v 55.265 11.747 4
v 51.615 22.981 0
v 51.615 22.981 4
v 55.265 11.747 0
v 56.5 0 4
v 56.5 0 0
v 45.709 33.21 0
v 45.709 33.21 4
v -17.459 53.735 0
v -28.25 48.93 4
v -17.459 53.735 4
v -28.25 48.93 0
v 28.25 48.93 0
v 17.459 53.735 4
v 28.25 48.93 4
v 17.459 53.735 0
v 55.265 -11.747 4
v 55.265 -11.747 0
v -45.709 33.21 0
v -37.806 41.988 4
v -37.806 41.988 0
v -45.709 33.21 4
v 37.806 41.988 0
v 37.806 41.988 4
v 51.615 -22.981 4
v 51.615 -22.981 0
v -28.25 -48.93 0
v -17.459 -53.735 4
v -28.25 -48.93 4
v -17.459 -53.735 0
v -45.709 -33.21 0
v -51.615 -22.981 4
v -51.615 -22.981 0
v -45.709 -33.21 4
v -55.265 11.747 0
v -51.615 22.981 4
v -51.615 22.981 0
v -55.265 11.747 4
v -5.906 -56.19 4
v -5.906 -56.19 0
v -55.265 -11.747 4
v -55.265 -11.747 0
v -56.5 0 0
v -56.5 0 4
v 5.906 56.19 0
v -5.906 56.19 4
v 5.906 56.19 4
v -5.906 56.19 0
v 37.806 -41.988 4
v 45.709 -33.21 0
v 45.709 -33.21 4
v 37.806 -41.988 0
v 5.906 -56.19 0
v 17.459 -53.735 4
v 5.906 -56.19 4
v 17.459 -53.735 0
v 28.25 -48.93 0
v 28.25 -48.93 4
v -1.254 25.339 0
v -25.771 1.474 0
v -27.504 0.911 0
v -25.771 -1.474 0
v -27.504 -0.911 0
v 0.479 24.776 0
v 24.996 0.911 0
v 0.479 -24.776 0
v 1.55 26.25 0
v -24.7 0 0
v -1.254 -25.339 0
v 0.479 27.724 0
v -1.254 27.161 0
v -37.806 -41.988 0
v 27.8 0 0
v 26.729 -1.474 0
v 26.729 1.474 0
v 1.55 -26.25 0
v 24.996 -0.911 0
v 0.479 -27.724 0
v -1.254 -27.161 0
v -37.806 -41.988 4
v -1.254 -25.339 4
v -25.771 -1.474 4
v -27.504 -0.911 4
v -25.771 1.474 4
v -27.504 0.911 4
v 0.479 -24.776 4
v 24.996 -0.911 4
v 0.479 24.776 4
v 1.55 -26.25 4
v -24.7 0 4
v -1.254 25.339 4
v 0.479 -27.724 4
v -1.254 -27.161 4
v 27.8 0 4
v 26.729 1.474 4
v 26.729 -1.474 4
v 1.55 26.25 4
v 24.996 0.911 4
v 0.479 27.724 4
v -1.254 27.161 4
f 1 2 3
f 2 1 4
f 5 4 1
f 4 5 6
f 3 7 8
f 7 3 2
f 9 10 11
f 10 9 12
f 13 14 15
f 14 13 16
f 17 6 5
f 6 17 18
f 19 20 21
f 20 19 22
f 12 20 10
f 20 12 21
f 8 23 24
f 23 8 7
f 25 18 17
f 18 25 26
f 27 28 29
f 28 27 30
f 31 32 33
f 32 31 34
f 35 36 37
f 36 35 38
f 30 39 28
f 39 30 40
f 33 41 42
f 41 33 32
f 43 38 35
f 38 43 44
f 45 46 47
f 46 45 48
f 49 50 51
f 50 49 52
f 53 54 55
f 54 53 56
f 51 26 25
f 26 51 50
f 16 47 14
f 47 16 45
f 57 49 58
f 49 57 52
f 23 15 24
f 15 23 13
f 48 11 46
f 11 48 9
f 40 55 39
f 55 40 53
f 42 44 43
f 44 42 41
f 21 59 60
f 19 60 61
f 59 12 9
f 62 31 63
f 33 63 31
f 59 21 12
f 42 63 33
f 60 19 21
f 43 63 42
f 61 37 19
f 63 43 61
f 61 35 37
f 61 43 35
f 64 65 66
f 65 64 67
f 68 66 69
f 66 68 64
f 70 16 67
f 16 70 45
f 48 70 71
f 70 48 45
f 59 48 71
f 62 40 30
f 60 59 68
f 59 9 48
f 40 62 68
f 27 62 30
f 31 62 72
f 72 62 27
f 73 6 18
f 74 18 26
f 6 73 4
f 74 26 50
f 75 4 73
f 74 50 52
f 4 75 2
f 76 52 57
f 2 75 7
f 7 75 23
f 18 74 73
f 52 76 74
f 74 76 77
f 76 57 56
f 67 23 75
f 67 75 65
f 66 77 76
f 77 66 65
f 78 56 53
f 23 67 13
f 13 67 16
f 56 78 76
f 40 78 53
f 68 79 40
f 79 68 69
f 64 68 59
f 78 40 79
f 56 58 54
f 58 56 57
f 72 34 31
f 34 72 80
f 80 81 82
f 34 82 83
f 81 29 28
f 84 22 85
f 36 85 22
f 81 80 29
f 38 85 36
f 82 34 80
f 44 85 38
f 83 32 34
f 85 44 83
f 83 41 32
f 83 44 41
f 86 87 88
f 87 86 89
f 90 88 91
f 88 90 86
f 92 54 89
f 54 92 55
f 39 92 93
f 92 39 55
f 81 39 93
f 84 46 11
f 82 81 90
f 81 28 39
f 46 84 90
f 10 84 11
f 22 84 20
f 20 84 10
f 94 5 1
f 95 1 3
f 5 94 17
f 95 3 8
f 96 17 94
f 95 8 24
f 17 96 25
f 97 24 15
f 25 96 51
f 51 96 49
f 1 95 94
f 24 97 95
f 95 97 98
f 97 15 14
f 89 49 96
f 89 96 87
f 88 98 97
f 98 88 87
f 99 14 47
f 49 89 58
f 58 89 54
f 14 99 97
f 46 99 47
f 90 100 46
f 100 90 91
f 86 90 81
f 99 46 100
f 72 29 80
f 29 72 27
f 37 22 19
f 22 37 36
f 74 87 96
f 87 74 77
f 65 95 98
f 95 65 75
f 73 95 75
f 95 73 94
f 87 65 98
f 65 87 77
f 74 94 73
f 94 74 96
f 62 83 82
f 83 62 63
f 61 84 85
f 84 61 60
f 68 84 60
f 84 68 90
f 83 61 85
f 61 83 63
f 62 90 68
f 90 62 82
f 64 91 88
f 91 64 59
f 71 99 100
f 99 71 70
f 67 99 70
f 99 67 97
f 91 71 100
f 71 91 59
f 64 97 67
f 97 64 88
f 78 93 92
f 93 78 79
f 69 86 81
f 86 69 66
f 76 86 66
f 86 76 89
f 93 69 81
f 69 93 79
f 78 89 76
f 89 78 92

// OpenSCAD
echo(version=version());

// units in mm
BASE_WIDTH = 113.0;
BASE_HEIGHT = 53.0;
BASE_WALL = 4.0;
INNER_RIDGE_HEIGHT = 6.0;
INNER_RIDGE_WIDTH = 2.0;

PLATFORM_WIDTH = 100.0;
PLATFORM_HEIGHT = 4.0;

SUPPORT_WIDTH = BASE_WIDTH - INNER_RIDGE_WIDTH * 4;
SUPPORT_HEIGHT = 20.0;

ROD_WIDTH = 8.1; // m8 
ROD_DEPTH = 10.0;
ROD_PLACEMENT = (BASE_WIDTH - INNER_RIDGE_WIDTH * 4) / 4;

BEARING_HEIGHT = 25.0;
BEARING_WIDTH = 15.2;
ROD_SHAFT_HEIGHT = BEARING_HEIGHT;
ROD_SHAFT_WIDTH = BEARING_WIDTH + 4;

STEPPER_ROD_NUT_WIDTH = 13.0;
STEPPER_ROD_HEIGHT = ROD_SHAFT_HEIGHT;
STEPPER_ROD_NUT_WALL = STEPPER_ROD_NUT_WIDTH + 4;

// stepper dims
STEPPER_WIDTH = 42.3;
STEPPER_HEIGHT = 33.0;
STEPPER_SCREW_SPACE = 31.0; 
STEPPER_HALF_SPACE = STEPPER_SCREW_SPACE / 2;
STEPPER_SCREW_SIZE = 3.1; // m3
STEPPER_SHAFT = 7.0;

// top shelf
difference() {
    cylinder(h=PLATFORM_HEIGHT, d=BASE_WIDTH);
    
     // bottom/top connections
     translate([ROD_PLACEMENT, 0, 0])
        cylinder(h=PLATFORM_HEIGHT, d=STEPPER_SCREW_SIZE);
     translate([-1 * ROD_PLACEMENT, 0, 0])
        cylinder(h=PLATFORM_HEIGHT, d=STEPPER_SCREW_SIZE);
     translate([0, ROD_PLACEMENT, 0])
        cylinder(h=PLATFORM_HEIGHT, d=STEPPER_SCREW_SIZE);
    translate([0, -1 * ROD_PLACEMENT, 0])
        cylinder(h=PLATFORM_HEIGHT, d=STEPPER_SCREW_SIZE);
}
